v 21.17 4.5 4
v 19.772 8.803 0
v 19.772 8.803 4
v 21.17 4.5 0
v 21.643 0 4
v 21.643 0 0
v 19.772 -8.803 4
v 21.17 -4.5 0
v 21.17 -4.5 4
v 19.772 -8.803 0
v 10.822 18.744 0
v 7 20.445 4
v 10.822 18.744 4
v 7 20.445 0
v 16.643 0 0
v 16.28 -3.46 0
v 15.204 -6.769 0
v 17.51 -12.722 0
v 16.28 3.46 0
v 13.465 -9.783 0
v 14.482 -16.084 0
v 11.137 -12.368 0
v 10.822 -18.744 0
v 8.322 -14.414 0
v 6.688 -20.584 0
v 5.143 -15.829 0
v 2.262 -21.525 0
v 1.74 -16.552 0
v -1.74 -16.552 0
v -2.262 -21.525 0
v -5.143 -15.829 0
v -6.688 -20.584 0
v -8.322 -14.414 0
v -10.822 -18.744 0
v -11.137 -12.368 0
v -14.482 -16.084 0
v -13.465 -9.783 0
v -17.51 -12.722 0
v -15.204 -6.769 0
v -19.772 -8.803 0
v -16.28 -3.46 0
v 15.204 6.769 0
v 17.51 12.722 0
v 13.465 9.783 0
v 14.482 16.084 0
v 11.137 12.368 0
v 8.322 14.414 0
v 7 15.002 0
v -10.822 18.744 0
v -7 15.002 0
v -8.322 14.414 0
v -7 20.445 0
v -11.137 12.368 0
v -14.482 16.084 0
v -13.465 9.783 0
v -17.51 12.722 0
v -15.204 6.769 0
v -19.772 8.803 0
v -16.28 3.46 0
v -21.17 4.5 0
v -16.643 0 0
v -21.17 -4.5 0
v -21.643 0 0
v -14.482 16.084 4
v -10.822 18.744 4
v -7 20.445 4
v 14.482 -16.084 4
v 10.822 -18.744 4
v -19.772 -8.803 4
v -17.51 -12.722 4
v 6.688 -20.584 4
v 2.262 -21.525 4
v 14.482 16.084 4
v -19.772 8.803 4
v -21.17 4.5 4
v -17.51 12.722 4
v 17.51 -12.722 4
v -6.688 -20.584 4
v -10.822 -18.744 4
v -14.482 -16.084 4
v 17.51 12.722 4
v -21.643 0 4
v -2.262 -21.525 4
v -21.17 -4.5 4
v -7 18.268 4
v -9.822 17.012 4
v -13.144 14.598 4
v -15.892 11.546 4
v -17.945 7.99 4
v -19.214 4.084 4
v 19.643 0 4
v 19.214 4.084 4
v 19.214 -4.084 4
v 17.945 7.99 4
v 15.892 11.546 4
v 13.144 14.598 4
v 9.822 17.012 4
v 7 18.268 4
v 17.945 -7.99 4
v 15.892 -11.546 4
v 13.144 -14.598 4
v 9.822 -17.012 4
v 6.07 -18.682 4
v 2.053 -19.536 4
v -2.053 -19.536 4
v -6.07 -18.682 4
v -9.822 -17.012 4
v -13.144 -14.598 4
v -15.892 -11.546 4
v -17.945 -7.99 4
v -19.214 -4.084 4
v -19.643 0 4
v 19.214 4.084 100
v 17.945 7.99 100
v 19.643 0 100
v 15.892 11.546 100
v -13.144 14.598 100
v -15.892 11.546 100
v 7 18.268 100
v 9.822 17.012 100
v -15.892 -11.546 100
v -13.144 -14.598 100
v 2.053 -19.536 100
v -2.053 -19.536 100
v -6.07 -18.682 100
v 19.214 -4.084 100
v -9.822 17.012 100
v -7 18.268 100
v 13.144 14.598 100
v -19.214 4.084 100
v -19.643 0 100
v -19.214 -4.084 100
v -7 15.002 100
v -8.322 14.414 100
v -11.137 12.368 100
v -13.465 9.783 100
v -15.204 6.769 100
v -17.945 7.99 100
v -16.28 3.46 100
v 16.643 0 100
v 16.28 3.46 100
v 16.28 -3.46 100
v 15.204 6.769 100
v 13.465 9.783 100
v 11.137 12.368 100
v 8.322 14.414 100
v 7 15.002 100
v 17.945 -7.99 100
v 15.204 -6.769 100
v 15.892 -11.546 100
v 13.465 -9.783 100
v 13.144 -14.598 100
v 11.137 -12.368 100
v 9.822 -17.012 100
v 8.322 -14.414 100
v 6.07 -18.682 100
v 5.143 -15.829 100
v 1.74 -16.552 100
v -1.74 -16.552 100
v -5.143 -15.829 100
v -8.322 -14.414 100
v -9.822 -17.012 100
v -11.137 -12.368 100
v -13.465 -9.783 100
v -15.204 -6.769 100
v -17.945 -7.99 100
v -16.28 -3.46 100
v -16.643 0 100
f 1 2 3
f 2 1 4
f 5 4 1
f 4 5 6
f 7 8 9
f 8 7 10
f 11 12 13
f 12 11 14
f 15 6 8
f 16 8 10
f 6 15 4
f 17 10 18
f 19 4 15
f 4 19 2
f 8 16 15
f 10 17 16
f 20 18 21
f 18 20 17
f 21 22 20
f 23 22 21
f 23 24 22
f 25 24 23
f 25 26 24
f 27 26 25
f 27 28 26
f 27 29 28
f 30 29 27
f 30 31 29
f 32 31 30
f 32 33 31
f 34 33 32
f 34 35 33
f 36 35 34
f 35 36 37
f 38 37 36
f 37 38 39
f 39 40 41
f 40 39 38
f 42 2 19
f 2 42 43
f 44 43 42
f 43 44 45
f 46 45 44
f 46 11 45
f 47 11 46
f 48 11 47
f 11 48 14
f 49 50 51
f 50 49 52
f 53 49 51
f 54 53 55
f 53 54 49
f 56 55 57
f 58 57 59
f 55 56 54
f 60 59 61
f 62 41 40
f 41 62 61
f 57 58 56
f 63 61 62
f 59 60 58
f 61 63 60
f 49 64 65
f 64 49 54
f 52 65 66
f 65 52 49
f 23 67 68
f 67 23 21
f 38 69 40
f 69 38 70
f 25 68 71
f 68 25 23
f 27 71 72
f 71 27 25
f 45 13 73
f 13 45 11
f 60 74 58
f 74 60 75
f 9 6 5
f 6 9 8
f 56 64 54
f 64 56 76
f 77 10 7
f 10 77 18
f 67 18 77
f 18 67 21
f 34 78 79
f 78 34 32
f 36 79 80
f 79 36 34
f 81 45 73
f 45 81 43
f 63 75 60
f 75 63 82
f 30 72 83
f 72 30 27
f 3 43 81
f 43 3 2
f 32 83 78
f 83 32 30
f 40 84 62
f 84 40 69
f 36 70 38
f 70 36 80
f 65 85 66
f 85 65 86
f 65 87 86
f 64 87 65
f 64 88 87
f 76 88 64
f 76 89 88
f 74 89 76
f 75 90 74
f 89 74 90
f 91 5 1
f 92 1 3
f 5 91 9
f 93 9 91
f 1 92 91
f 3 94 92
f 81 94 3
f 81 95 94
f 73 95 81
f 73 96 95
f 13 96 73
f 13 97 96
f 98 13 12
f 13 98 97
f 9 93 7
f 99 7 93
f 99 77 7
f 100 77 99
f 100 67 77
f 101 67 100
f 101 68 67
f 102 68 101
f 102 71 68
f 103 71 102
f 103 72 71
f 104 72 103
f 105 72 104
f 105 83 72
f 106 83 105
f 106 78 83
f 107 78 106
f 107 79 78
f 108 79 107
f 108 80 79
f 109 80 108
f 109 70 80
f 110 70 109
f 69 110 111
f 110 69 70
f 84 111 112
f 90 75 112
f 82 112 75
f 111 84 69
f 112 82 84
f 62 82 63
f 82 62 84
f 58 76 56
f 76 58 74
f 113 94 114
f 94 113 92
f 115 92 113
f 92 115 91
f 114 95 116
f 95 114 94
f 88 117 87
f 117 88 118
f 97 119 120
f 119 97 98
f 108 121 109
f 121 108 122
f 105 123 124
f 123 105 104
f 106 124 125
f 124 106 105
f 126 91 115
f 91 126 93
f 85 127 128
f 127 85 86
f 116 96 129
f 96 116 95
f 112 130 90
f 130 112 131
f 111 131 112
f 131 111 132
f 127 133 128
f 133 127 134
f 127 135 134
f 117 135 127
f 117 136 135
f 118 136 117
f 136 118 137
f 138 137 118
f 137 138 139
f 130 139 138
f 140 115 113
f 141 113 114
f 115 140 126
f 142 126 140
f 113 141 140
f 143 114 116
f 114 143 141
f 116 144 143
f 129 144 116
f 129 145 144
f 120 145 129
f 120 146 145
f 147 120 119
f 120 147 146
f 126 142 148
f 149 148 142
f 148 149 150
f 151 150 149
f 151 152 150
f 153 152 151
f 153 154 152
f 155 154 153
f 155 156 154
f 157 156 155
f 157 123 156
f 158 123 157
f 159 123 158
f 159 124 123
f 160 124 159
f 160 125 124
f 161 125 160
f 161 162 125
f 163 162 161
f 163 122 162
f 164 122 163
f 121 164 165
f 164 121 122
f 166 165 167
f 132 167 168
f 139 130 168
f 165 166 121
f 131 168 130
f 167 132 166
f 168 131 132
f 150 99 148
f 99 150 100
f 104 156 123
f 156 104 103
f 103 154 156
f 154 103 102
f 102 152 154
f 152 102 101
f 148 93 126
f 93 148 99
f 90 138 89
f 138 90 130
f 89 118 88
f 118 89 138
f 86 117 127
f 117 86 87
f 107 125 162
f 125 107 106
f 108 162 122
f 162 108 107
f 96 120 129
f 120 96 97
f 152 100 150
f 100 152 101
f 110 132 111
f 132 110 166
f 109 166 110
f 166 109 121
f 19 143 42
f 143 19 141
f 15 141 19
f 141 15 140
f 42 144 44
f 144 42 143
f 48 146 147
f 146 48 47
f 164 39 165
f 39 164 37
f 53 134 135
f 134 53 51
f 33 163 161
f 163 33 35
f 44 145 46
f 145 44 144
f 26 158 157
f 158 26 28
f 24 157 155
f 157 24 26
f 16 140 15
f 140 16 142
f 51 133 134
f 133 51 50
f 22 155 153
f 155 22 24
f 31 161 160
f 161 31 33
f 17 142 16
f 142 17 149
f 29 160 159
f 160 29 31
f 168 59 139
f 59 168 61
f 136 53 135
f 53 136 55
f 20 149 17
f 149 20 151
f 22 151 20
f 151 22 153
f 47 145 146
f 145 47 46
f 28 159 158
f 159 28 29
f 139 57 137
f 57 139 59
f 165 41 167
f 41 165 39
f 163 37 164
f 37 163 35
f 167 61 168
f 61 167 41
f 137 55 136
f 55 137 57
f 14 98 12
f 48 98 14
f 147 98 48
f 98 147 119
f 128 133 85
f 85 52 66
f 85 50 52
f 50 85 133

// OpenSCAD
//smaller width of the stick in mm
width_a=18;
//larger width of the stick in mm
width_b=28;
//height you want your handle (height of your hand)
height=100;

////calculations////
width_c=(width_a/2)-2;
diameter=sqrt(pow(width_a,2)+pow(width_b,2));

module base(){
union(){
cylinder(d=diameter+10,h=4);
cylinder(d=diameter+6,h=height);
}}

difference(){
base();
cylinder(d=diameter,h=height);
translate([-width_c,diameter/2-3,0])cube([width_a-4,width_a-4,height]);
}


//to see how it fits on your stick un comment the following code
//cube([width_a,width_b,height],center=true);
